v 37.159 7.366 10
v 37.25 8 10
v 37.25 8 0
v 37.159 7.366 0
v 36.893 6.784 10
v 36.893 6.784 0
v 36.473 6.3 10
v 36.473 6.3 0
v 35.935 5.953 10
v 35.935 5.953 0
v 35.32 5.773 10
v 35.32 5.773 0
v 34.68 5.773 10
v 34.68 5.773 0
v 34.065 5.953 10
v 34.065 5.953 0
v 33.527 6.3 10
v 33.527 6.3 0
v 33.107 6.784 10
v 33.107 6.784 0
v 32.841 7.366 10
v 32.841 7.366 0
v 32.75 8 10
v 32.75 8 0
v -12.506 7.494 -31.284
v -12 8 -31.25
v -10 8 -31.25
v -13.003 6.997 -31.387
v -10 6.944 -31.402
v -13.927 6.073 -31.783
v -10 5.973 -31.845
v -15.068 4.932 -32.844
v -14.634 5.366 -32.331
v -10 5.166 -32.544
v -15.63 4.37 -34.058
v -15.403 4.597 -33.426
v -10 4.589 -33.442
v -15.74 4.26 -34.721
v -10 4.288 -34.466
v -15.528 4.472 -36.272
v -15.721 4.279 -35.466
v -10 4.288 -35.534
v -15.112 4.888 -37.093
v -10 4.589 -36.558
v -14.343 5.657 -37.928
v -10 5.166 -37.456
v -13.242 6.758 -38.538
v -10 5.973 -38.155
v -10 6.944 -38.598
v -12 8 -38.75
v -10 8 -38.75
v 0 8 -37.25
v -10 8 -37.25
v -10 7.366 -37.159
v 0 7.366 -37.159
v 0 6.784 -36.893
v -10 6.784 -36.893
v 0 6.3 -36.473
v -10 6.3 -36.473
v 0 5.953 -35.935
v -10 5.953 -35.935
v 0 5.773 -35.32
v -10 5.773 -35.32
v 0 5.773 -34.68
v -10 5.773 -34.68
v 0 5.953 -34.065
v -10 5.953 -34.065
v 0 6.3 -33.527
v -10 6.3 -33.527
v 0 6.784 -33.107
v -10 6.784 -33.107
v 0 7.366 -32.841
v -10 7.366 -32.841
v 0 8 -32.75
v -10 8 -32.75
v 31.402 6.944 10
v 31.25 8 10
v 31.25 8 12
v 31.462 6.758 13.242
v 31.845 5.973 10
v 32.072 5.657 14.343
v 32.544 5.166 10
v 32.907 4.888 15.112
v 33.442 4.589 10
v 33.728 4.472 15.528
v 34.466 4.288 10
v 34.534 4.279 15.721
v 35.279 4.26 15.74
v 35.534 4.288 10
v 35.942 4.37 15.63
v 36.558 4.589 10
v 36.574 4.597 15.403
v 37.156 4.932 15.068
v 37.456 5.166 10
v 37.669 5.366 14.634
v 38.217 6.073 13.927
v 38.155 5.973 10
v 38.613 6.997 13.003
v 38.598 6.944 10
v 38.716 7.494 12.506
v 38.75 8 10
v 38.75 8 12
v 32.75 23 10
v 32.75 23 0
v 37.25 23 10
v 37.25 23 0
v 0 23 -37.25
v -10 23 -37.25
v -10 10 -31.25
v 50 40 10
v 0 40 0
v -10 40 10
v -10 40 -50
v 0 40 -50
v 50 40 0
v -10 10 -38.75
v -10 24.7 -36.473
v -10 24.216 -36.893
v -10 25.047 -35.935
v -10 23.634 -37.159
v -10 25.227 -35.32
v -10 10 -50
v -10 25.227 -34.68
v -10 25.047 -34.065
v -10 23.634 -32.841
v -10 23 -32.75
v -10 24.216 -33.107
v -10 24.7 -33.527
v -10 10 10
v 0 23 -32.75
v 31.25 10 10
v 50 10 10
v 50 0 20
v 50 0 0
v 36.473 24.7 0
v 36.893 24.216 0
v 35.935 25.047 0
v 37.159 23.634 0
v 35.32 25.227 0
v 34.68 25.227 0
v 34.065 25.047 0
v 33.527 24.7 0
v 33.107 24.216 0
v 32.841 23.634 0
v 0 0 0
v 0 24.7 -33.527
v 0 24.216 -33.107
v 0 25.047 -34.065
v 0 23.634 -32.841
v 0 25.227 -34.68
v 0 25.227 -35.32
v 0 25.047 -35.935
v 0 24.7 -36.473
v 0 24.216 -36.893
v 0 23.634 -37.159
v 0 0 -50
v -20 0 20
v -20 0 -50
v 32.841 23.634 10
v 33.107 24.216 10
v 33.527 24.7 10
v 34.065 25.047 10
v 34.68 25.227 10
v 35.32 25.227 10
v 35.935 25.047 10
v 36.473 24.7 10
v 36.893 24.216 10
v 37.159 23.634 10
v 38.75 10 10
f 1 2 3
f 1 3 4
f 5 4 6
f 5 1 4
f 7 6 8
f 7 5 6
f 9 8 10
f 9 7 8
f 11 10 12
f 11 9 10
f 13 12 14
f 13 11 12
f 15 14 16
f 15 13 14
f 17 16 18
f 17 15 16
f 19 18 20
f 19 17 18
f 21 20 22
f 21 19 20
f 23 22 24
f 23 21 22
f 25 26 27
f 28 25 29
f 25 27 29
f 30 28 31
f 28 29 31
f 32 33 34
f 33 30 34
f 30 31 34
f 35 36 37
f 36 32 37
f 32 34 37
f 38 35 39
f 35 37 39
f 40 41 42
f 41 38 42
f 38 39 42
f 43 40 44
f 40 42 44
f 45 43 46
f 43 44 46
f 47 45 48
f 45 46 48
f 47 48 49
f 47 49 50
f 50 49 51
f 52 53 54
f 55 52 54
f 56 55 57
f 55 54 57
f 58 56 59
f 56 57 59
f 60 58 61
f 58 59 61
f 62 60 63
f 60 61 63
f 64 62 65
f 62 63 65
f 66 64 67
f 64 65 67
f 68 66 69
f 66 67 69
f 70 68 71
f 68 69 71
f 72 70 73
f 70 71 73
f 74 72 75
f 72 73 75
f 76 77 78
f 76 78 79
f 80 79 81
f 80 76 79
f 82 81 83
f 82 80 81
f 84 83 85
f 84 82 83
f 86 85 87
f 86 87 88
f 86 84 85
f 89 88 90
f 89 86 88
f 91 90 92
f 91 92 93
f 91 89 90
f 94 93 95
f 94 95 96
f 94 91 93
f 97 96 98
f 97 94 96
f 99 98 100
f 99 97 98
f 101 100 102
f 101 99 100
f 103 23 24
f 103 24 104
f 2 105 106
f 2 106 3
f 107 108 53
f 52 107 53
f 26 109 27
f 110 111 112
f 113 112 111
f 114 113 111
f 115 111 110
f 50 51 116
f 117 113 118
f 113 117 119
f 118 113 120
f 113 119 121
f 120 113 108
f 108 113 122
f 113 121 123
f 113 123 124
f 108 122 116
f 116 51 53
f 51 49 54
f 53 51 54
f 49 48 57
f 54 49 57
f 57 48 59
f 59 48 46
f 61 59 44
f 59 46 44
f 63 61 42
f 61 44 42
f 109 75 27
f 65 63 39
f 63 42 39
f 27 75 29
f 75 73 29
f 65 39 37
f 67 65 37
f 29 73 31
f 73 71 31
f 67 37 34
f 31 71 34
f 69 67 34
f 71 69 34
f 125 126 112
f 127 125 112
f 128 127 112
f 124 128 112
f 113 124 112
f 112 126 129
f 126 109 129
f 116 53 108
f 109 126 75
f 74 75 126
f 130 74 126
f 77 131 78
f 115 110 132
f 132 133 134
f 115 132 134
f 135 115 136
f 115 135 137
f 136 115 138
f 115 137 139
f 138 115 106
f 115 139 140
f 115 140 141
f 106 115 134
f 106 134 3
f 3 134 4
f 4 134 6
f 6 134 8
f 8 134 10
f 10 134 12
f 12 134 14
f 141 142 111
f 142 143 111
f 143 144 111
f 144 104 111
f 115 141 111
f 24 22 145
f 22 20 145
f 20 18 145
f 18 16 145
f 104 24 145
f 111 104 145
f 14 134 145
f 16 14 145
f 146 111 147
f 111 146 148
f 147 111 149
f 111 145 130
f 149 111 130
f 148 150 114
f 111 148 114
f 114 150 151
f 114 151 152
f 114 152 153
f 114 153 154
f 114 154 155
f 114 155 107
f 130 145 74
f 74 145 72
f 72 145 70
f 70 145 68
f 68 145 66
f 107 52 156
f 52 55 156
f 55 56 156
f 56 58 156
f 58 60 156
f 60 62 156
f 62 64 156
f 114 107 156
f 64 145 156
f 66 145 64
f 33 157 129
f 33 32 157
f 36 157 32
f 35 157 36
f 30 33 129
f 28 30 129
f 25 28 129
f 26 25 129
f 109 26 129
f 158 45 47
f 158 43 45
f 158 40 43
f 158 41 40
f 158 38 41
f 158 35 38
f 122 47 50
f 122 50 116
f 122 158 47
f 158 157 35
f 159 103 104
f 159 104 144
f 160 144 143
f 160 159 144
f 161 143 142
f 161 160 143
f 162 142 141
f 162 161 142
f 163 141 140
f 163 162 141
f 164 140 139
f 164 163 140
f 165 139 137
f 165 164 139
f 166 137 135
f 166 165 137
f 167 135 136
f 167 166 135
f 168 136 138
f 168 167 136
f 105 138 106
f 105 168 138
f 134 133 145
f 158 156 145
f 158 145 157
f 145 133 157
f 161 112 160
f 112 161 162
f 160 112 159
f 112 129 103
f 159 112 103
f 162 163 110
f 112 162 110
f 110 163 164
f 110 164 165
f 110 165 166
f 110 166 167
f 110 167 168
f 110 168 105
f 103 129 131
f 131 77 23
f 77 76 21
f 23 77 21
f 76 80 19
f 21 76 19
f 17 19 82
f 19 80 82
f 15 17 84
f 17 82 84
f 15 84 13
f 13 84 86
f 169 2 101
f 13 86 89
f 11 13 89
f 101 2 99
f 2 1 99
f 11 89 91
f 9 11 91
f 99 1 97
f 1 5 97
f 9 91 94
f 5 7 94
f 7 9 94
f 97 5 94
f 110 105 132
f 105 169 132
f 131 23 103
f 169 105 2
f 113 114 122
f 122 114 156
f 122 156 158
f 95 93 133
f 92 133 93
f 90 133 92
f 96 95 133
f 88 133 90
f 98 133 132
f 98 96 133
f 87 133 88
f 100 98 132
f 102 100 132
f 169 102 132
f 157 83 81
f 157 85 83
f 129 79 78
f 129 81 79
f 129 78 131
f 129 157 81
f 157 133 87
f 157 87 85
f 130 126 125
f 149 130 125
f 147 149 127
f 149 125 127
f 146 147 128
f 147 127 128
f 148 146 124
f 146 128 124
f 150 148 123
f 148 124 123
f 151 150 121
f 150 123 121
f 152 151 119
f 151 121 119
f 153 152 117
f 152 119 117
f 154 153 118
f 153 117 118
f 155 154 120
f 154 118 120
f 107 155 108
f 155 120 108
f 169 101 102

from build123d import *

# Parameters (mm, degrees)
BOSS_EXTRUDE1_DEPTH = 40
BOSS_EXTRUDE2_DEPTH = 15
DRAFT1_START        = -20
DRAFT1_DEPTH        = 70
DRAFT1_START_2      = -50
DRAFT1_2_DEPTH      = 71
CUT_EXTRUDE1_DEPTH  = 88.749643874
CUT_EXTRUDE3_DEPTH  = 88.749643874


with BuildPart() as part:
    # Sketch1 → Boss-Extrude1 (new body)
    with BuildSketch(Plane(origin=(0, 0, 0), x_dir=(1, 0, 0), z_dir=(0, 1, 0))):
        Polygon((0, 0), (0, 50), (-10, 50), (-10, -10), (50, -10), (50, 0), align=None)
    extrude(amount=BOSS_EXTRUDE1_DEPTH)

    # Sketch2 → Boss-Extrude2 (add)
    with BuildSketch(Plane.XZ):
        Polygon((50, 20), (50, 10), (-10, 10), (-10, -50), (-20, -50), (-20, 20), align=None)
    extrude(amount=-BOSS_EXTRUDE2_DEPTH)

    # Draft1: read off the stored shape, not the designer's step
    # Draft1 outline → Draft1 (cut)
    with BuildSketch(Plane.YZ.offset(DRAFT1_START)):
        Polygon((0, 20), (10, 10), (15, 10), (15, 20), align=None)
    extrude(amount=DRAFT1_DEPTH, mode=Mode.SUBTRACT)

    # Draft1 2 outline → Draft1 2 (cut)
    with BuildSketch(Plane.XY.offset(DRAFT1_START_2)):
        Polygon((-20, 0), (-10, 10), (-10, 15), (-20, 15), align=None)
    extrude(amount=DRAFT1_2_DEPTH, mode=Mode.SUBTRACT)

    # Sketch3 → Cut-Extrude1 (cut, through all)
    with BuildSketch(Plane.XY.offset(10)):
        with BuildLine():
            Line((37.25, 23), (37.25, 8))
            ThreePointArc((37.25, 8), (35, 5.75), (32.75, 8))
            Line((32.75, 8), (32.75, 23))
            ThreePointArc((32.75, 23), (35, 25.25), (37.25, 23))
        make_face()
    cut_extrude1 = extrude(amount=-CUT_EXTRUDE1_DEPTH, mode=Mode.SUBTRACT)

    # Sketch4 → Cut-Extrude3 (cut, through all)
    with BuildSketch(Plane.XY.offset(10)):
        with BuildLine():
            Line((38.75, 8), (38.75, 23))
            ThreePointArc((38.75, 23), (35, 26.75), (31.25, 23))
            Line((31.25, 23), (31.25, 8))
            ThreePointArc((31.25, 8), (35, 4.25), (38.75, 8))
        make_face()
    cut_extrude3 = extrude(amount=CUT_EXTRUDE3_DEPTH, mode=Mode.SUBTRACT)

    # Mirror1: Cut-Extrude1, Cut-Extrude3 across plane
    add(cut_extrude1.mirror(Plane(origin=(0, 0, 0), x_dir=(-0.7071067811865476, 0, 0.7071067811865476), z_dir=(-0.7071067811865477, 0, -0.7071067811865475))), mode=Mode.SUBTRACT)
    add(cut_extrude3.mirror(Plane(origin=(0, 0, 0), x_dir=(-0.7071067811865476, 0, 0.7071067811865476), z_dir=(-0.7071067811865477, 0, -0.7071067811865475))), mode=Mode.SUBTRACT)


solid = part.part
